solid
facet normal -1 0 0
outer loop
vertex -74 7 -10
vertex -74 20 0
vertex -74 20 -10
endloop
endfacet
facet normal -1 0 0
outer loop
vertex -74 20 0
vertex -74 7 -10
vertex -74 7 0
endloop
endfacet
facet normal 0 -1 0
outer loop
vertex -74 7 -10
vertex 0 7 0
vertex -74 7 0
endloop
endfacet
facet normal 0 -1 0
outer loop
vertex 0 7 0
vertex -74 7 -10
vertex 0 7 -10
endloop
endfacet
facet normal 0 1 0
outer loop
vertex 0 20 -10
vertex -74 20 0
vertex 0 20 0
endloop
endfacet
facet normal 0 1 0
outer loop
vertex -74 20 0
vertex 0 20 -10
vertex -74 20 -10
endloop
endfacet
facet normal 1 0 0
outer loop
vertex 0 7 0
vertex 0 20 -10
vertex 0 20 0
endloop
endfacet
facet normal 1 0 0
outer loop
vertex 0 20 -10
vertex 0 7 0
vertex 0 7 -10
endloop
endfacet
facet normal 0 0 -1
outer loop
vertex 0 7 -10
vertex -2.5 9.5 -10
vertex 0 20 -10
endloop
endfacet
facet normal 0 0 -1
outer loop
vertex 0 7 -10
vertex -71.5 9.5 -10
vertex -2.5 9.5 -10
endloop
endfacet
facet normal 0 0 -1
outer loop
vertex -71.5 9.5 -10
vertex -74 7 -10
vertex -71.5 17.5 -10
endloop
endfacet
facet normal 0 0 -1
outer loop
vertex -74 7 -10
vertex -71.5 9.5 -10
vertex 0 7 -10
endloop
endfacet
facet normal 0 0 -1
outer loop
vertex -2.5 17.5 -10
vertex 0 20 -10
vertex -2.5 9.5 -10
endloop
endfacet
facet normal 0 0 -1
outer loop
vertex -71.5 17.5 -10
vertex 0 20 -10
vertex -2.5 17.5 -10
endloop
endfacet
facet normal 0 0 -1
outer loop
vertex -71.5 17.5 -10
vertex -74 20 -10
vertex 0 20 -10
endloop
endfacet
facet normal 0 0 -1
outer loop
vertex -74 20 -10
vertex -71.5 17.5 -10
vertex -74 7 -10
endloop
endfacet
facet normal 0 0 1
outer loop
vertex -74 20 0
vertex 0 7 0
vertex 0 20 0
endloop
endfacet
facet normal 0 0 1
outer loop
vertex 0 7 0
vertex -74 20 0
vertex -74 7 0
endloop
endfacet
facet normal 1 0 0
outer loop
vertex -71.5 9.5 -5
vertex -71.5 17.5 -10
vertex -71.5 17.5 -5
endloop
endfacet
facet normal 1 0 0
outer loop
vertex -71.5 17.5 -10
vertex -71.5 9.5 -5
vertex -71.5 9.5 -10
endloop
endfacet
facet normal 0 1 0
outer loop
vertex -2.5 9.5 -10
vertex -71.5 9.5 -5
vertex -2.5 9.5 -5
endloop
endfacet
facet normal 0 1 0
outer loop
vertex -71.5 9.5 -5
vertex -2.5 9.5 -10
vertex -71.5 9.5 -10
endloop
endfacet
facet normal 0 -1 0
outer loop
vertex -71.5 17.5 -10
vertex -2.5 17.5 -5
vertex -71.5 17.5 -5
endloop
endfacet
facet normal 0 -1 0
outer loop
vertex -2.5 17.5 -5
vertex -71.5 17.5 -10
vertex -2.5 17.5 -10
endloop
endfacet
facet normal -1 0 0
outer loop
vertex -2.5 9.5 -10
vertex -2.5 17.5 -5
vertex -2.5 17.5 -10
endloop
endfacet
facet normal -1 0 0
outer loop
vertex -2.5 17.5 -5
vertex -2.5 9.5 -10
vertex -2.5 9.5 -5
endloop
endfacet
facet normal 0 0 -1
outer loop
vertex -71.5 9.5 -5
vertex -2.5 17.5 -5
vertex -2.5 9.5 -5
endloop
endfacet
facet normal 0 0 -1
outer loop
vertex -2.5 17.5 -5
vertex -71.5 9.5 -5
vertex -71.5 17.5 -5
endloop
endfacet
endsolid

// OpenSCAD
// Testing Size


translate([00,20])
rotate([-270,180,0])
{
difference() {
cube( [74,10,13] );
translate ([2.5,5,2.5])    
    cube ( [69,8,8]);    
}

//translate([37,0,6.5])
//rotate([90,90,0])
//    cylinder (r=6,h = 25,$fn=50);

}
